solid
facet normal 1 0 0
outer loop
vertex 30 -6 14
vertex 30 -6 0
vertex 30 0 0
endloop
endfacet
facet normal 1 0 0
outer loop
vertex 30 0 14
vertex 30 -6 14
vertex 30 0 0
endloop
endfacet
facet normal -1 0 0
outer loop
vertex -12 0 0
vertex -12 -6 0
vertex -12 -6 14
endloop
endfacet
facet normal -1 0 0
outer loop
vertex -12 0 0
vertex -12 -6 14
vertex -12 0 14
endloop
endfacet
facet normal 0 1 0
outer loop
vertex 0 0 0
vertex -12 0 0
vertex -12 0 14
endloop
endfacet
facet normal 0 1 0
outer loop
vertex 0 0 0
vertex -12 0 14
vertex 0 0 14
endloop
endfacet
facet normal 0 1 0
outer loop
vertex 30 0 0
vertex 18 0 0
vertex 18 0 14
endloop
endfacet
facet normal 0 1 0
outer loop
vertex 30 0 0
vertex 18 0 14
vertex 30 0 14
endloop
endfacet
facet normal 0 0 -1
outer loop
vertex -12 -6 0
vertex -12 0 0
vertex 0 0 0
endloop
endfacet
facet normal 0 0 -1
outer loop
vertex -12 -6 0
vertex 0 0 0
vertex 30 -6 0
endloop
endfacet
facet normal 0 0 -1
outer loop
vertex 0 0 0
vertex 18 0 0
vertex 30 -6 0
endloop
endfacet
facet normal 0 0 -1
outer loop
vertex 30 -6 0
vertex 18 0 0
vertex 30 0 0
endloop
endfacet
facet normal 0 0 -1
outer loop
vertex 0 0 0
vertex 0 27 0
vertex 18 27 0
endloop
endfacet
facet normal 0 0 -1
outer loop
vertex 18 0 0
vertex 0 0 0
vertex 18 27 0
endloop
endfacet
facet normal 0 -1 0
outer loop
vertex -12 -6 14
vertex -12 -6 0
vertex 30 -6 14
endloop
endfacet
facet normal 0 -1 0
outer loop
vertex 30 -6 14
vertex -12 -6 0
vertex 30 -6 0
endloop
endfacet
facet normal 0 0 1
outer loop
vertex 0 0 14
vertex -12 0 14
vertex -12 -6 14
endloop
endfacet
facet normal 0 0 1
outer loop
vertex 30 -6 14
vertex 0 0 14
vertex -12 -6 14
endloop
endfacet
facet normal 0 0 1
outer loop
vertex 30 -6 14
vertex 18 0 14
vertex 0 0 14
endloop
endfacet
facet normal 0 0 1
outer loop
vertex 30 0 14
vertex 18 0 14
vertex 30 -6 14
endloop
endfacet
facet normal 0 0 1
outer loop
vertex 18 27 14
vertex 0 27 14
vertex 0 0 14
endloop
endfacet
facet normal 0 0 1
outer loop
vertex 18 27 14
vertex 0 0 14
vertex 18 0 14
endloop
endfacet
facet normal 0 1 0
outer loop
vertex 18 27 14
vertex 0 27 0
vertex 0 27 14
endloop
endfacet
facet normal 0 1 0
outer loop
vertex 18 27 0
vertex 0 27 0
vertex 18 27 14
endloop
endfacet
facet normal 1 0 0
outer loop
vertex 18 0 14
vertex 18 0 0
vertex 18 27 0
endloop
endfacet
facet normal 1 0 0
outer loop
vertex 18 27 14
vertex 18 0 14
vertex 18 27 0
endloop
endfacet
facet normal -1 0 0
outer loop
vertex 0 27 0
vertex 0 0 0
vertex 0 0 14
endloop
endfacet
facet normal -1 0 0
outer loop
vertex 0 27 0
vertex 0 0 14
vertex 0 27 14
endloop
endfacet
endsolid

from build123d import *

# Parameters (mm, degrees)
BOX014_W     = 42
BOX014_H     = 6
BOX014_DEPTH = 14
BOX016_W     = 18
BOX016_H     = 27
BOX016_DEPTH = 14


with BuildPart() as cube009:
    # Box014 → Box014 (new body)
    with BuildSketch(Plane(origin=(-12, -6, 0), x_dir=(1, 0, 0), z_dir=(0, 0, 1))):
        with Locations((21, 3)):
            Rectangle(BOX014_W, BOX014_H)
    extrude(amount=BOX014_DEPTH)


with BuildPart() as fusion007006:
    # Box016 → Box016 (new body)
    with BuildSketch(Plane.XY):
        with Locations((9, 13.5)):
            Rectangle(BOX016_W, BOX016_H)
    extrude(amount=BOX016_DEPTH)

    # Fusion007006: union Cube009
    add(cube009.part)


solid = fusion007006.part
